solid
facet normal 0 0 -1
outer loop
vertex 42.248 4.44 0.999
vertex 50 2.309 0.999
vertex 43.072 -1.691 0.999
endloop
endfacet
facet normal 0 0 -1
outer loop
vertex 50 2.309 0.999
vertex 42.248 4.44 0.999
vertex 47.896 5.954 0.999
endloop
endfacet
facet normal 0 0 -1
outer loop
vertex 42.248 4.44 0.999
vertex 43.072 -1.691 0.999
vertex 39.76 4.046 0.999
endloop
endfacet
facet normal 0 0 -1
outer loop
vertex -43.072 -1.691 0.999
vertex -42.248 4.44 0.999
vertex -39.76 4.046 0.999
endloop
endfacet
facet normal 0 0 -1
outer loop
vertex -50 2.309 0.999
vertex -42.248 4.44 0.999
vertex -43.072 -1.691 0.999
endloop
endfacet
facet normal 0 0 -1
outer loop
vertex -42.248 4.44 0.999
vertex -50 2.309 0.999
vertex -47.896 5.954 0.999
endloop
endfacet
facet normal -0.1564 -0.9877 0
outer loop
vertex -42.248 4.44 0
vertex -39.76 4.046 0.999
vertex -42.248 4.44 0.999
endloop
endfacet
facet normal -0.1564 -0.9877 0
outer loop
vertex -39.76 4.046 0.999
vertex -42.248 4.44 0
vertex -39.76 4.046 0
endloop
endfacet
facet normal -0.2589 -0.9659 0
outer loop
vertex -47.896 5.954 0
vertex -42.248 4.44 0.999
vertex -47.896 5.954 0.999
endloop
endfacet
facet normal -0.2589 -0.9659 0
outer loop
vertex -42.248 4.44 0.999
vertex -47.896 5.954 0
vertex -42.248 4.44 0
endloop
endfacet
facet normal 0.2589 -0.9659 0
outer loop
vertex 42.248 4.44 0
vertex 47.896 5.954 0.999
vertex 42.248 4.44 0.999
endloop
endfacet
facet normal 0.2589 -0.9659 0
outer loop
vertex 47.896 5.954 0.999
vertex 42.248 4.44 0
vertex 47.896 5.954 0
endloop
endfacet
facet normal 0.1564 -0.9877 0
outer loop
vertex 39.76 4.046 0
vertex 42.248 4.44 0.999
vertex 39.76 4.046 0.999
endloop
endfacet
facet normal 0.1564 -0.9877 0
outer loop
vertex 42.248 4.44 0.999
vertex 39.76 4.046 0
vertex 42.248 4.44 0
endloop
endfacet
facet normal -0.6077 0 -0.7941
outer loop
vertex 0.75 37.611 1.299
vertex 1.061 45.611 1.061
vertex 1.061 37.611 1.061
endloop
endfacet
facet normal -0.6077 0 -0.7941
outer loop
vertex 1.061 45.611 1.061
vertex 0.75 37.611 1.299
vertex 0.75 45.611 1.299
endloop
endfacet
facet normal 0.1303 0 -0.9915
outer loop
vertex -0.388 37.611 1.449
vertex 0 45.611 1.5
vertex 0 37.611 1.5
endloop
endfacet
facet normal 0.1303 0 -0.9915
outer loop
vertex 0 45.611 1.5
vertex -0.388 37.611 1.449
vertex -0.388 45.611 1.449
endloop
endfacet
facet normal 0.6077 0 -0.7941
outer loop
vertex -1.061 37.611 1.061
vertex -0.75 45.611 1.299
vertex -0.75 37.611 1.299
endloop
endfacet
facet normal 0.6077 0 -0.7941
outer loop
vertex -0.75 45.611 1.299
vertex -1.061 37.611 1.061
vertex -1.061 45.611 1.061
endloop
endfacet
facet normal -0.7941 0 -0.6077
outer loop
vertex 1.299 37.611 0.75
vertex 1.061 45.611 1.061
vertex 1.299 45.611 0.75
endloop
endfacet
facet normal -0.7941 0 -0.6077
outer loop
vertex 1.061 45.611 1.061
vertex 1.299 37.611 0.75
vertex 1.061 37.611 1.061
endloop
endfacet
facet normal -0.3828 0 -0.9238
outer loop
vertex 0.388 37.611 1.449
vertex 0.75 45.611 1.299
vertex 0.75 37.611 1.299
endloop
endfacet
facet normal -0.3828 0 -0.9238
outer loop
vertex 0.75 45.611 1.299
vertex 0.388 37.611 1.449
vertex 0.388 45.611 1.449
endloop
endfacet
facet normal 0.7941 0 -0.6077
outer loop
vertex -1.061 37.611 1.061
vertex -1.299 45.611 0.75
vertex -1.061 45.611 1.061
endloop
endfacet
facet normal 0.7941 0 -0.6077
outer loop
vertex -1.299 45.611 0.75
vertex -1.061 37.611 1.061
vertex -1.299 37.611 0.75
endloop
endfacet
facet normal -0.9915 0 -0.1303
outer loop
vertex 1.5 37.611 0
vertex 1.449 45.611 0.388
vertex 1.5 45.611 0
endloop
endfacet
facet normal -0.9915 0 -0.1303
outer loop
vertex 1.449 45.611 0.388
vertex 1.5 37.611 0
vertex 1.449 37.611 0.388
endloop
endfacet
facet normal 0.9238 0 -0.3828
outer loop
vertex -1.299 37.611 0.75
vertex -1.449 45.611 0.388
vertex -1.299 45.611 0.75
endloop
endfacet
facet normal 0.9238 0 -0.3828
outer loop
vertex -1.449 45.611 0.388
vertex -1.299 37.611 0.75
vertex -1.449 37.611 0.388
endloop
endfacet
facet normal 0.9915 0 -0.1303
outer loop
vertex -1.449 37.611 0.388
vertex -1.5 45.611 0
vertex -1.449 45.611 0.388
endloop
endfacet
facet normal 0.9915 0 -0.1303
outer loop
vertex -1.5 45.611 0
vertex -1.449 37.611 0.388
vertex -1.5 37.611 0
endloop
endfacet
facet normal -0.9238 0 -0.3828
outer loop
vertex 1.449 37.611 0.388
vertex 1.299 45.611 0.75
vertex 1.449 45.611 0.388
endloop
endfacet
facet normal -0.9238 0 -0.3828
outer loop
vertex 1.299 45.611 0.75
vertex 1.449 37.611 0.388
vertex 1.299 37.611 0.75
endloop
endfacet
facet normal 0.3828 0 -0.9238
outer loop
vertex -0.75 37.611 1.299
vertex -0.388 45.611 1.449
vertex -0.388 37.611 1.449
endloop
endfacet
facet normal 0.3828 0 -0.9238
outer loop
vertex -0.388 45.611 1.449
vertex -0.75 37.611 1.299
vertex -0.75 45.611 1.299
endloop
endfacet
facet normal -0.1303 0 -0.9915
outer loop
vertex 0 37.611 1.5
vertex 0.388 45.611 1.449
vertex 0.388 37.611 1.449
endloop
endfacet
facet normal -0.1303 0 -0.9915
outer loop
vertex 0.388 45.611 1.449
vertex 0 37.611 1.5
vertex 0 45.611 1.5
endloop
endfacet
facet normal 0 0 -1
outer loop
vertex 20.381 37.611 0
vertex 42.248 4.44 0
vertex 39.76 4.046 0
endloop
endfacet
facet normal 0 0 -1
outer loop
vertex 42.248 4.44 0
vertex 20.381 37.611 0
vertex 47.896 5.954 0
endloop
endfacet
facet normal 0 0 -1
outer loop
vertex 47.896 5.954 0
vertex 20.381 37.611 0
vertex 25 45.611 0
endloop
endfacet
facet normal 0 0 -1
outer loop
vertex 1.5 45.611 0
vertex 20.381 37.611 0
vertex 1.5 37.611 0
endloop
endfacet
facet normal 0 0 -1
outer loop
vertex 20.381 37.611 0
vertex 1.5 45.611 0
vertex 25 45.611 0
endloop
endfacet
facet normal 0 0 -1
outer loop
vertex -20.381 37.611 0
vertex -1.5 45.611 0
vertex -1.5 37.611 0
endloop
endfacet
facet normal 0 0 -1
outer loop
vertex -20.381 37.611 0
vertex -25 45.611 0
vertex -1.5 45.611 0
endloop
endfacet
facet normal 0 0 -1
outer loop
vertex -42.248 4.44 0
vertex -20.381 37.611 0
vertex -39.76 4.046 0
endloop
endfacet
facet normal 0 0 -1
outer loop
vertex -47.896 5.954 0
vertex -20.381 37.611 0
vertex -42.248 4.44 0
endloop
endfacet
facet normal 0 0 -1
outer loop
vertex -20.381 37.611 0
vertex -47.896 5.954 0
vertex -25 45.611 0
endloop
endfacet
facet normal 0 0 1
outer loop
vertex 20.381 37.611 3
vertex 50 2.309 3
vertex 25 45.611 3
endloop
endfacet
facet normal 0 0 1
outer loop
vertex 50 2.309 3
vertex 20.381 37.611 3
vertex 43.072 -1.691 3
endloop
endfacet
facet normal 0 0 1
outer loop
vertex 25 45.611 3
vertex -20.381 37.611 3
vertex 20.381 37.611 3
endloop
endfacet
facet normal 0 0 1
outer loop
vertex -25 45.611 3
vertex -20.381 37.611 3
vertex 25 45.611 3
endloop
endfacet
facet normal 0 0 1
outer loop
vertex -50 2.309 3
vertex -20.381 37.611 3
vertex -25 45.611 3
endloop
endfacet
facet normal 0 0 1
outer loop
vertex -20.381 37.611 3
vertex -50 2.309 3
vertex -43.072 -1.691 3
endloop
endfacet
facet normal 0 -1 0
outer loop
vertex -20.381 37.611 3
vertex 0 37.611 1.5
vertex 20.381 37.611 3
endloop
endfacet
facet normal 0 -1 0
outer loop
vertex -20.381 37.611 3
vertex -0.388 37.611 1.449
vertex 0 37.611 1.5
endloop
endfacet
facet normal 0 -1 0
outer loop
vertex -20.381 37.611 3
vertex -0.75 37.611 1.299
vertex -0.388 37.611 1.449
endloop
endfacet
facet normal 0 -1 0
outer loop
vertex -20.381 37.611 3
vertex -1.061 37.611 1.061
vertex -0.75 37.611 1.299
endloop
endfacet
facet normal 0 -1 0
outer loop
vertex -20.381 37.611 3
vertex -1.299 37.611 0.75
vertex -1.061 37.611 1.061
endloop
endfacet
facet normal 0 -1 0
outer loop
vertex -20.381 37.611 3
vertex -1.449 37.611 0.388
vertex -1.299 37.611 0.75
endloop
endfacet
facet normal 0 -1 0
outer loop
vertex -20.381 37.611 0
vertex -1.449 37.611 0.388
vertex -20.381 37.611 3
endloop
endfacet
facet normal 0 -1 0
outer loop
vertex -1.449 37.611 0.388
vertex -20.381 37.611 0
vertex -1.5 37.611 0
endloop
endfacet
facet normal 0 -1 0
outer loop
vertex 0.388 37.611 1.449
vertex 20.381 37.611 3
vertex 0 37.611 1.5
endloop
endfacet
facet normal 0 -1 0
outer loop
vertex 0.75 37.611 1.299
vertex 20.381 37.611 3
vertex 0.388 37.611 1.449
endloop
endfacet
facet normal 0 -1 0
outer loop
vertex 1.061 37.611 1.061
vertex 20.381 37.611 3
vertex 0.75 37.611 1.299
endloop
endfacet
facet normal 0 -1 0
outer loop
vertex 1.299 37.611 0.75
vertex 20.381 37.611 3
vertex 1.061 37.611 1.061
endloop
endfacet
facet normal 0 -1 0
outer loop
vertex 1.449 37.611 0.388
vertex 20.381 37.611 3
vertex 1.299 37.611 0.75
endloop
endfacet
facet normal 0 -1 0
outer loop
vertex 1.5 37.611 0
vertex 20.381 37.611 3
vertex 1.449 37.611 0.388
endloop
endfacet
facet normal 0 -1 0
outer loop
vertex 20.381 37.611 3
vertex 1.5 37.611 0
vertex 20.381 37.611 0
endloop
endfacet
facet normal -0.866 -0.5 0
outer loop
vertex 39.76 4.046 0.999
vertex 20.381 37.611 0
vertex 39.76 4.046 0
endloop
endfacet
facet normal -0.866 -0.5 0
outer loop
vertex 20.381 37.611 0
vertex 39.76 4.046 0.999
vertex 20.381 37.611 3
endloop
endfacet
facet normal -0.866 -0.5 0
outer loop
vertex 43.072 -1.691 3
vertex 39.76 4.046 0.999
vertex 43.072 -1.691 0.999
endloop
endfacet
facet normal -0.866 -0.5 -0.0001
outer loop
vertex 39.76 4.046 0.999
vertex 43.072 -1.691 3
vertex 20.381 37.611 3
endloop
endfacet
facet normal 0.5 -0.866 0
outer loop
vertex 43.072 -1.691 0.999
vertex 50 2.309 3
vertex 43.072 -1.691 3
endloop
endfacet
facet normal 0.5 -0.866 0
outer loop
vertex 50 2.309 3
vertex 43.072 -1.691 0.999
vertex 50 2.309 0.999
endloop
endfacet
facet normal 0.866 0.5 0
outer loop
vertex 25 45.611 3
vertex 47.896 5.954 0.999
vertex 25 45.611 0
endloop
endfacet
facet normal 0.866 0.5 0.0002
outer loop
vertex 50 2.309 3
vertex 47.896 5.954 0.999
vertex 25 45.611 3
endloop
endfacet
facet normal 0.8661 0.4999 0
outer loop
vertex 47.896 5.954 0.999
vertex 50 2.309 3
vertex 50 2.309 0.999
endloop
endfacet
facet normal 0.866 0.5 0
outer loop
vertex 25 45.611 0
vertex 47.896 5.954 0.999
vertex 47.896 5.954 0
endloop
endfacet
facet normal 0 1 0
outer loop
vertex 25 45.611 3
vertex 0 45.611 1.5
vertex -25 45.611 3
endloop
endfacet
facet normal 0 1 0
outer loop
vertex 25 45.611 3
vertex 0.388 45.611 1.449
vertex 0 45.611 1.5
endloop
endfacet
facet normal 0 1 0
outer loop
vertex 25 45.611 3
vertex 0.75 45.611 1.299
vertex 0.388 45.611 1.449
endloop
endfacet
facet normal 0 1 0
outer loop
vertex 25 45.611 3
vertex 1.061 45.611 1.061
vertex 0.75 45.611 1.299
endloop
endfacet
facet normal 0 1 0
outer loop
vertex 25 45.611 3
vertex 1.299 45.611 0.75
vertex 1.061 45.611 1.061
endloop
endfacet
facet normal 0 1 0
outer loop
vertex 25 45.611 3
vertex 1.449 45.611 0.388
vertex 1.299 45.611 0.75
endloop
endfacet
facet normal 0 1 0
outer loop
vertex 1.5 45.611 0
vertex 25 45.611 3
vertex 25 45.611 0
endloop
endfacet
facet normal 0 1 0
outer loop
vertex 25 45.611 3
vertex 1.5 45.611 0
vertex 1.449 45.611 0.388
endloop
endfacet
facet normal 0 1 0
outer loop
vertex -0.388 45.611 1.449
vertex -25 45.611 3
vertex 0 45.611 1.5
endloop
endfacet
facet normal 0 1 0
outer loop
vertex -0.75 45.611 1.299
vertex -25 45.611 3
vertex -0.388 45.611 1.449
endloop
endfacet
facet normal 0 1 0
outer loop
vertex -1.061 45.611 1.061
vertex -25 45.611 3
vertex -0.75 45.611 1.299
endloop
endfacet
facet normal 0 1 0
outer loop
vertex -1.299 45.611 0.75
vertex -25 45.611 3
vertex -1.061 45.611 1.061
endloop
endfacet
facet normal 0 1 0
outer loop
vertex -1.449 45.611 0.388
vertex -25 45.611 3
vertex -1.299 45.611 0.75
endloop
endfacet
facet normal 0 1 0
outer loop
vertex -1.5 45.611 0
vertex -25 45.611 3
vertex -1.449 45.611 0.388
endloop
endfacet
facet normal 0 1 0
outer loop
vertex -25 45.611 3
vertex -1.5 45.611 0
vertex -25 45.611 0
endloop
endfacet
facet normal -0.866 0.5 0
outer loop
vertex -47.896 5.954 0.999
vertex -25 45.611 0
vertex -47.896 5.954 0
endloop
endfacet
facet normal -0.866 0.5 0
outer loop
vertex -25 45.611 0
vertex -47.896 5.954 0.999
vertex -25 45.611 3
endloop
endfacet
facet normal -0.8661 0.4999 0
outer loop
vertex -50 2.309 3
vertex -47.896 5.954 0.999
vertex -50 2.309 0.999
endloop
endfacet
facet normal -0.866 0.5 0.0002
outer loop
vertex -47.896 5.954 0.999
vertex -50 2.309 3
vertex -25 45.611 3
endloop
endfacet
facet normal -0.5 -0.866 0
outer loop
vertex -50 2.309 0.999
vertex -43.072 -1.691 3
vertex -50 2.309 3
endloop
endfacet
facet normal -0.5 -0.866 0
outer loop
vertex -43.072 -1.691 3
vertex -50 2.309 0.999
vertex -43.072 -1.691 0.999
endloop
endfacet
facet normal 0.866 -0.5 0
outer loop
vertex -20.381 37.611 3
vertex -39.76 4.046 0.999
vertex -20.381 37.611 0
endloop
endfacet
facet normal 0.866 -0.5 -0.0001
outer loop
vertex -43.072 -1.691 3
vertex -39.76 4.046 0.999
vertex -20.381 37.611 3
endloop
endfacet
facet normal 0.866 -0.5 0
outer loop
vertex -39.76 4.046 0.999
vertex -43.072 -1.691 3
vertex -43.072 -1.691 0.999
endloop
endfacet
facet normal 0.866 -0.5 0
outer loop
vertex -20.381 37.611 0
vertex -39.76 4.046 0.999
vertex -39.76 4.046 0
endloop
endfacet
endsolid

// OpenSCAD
use <mylib.scad>;

f = .18;  // fudge
p = .001;
pp = 2 * p;
t0 = 1;
inch = 25.4;
rr = 8.25 * inch;
ri = rr - .25 * inch;

bh = 3; // bracket height

module ring(r1=20, r2 = 18, $fa=$fa, $fn=$fn) {
  difference() {
  circle(r=r1, $fa=$fa, $fn=$fn);
  circle(r2, $fa=$fa, $fn=$fn);
  }
}
module basket() {
  color ("white") 
  trr([0, 0, -p]) linear_extrude(height = t0) 
  trr([0, ri, 0]) ring(rr, ri, $fn=60);
  trr([0, 0, 0, [-90, 0, 0]])
  cylinder(h = ri*2, r = 1.5);
}

bw = 8;
bs = 50;
bm = sqrt(3)/2; // translate to close angle at corners
module bracket() {
  difference() {
    // approx      vv    but wrong for other bs
    trr([0, bw/(2*sqrt(3)), 0, [0, 0, -30]])
    linear_extrude(height = bh) 
      astack(3, [0, 0, 0, [0, 0, -60]]) {
        trr([-(bs-bw/sqrt(3))*bm, 0, 0])
        square(size = [bw, bs], center = true);
      }
    basket();
  }
}

pr = 1.5 * inch;  // puck radius
module puck(h = 1 * inch, r = 1.5 * inch) {
  color("#dbe8ff")
  cylinder(h = h, r = r);
}

// TODO atrans(...)
// trr([0, pr-(rr-ri), bh]) puck();
// basket();
bracket();
